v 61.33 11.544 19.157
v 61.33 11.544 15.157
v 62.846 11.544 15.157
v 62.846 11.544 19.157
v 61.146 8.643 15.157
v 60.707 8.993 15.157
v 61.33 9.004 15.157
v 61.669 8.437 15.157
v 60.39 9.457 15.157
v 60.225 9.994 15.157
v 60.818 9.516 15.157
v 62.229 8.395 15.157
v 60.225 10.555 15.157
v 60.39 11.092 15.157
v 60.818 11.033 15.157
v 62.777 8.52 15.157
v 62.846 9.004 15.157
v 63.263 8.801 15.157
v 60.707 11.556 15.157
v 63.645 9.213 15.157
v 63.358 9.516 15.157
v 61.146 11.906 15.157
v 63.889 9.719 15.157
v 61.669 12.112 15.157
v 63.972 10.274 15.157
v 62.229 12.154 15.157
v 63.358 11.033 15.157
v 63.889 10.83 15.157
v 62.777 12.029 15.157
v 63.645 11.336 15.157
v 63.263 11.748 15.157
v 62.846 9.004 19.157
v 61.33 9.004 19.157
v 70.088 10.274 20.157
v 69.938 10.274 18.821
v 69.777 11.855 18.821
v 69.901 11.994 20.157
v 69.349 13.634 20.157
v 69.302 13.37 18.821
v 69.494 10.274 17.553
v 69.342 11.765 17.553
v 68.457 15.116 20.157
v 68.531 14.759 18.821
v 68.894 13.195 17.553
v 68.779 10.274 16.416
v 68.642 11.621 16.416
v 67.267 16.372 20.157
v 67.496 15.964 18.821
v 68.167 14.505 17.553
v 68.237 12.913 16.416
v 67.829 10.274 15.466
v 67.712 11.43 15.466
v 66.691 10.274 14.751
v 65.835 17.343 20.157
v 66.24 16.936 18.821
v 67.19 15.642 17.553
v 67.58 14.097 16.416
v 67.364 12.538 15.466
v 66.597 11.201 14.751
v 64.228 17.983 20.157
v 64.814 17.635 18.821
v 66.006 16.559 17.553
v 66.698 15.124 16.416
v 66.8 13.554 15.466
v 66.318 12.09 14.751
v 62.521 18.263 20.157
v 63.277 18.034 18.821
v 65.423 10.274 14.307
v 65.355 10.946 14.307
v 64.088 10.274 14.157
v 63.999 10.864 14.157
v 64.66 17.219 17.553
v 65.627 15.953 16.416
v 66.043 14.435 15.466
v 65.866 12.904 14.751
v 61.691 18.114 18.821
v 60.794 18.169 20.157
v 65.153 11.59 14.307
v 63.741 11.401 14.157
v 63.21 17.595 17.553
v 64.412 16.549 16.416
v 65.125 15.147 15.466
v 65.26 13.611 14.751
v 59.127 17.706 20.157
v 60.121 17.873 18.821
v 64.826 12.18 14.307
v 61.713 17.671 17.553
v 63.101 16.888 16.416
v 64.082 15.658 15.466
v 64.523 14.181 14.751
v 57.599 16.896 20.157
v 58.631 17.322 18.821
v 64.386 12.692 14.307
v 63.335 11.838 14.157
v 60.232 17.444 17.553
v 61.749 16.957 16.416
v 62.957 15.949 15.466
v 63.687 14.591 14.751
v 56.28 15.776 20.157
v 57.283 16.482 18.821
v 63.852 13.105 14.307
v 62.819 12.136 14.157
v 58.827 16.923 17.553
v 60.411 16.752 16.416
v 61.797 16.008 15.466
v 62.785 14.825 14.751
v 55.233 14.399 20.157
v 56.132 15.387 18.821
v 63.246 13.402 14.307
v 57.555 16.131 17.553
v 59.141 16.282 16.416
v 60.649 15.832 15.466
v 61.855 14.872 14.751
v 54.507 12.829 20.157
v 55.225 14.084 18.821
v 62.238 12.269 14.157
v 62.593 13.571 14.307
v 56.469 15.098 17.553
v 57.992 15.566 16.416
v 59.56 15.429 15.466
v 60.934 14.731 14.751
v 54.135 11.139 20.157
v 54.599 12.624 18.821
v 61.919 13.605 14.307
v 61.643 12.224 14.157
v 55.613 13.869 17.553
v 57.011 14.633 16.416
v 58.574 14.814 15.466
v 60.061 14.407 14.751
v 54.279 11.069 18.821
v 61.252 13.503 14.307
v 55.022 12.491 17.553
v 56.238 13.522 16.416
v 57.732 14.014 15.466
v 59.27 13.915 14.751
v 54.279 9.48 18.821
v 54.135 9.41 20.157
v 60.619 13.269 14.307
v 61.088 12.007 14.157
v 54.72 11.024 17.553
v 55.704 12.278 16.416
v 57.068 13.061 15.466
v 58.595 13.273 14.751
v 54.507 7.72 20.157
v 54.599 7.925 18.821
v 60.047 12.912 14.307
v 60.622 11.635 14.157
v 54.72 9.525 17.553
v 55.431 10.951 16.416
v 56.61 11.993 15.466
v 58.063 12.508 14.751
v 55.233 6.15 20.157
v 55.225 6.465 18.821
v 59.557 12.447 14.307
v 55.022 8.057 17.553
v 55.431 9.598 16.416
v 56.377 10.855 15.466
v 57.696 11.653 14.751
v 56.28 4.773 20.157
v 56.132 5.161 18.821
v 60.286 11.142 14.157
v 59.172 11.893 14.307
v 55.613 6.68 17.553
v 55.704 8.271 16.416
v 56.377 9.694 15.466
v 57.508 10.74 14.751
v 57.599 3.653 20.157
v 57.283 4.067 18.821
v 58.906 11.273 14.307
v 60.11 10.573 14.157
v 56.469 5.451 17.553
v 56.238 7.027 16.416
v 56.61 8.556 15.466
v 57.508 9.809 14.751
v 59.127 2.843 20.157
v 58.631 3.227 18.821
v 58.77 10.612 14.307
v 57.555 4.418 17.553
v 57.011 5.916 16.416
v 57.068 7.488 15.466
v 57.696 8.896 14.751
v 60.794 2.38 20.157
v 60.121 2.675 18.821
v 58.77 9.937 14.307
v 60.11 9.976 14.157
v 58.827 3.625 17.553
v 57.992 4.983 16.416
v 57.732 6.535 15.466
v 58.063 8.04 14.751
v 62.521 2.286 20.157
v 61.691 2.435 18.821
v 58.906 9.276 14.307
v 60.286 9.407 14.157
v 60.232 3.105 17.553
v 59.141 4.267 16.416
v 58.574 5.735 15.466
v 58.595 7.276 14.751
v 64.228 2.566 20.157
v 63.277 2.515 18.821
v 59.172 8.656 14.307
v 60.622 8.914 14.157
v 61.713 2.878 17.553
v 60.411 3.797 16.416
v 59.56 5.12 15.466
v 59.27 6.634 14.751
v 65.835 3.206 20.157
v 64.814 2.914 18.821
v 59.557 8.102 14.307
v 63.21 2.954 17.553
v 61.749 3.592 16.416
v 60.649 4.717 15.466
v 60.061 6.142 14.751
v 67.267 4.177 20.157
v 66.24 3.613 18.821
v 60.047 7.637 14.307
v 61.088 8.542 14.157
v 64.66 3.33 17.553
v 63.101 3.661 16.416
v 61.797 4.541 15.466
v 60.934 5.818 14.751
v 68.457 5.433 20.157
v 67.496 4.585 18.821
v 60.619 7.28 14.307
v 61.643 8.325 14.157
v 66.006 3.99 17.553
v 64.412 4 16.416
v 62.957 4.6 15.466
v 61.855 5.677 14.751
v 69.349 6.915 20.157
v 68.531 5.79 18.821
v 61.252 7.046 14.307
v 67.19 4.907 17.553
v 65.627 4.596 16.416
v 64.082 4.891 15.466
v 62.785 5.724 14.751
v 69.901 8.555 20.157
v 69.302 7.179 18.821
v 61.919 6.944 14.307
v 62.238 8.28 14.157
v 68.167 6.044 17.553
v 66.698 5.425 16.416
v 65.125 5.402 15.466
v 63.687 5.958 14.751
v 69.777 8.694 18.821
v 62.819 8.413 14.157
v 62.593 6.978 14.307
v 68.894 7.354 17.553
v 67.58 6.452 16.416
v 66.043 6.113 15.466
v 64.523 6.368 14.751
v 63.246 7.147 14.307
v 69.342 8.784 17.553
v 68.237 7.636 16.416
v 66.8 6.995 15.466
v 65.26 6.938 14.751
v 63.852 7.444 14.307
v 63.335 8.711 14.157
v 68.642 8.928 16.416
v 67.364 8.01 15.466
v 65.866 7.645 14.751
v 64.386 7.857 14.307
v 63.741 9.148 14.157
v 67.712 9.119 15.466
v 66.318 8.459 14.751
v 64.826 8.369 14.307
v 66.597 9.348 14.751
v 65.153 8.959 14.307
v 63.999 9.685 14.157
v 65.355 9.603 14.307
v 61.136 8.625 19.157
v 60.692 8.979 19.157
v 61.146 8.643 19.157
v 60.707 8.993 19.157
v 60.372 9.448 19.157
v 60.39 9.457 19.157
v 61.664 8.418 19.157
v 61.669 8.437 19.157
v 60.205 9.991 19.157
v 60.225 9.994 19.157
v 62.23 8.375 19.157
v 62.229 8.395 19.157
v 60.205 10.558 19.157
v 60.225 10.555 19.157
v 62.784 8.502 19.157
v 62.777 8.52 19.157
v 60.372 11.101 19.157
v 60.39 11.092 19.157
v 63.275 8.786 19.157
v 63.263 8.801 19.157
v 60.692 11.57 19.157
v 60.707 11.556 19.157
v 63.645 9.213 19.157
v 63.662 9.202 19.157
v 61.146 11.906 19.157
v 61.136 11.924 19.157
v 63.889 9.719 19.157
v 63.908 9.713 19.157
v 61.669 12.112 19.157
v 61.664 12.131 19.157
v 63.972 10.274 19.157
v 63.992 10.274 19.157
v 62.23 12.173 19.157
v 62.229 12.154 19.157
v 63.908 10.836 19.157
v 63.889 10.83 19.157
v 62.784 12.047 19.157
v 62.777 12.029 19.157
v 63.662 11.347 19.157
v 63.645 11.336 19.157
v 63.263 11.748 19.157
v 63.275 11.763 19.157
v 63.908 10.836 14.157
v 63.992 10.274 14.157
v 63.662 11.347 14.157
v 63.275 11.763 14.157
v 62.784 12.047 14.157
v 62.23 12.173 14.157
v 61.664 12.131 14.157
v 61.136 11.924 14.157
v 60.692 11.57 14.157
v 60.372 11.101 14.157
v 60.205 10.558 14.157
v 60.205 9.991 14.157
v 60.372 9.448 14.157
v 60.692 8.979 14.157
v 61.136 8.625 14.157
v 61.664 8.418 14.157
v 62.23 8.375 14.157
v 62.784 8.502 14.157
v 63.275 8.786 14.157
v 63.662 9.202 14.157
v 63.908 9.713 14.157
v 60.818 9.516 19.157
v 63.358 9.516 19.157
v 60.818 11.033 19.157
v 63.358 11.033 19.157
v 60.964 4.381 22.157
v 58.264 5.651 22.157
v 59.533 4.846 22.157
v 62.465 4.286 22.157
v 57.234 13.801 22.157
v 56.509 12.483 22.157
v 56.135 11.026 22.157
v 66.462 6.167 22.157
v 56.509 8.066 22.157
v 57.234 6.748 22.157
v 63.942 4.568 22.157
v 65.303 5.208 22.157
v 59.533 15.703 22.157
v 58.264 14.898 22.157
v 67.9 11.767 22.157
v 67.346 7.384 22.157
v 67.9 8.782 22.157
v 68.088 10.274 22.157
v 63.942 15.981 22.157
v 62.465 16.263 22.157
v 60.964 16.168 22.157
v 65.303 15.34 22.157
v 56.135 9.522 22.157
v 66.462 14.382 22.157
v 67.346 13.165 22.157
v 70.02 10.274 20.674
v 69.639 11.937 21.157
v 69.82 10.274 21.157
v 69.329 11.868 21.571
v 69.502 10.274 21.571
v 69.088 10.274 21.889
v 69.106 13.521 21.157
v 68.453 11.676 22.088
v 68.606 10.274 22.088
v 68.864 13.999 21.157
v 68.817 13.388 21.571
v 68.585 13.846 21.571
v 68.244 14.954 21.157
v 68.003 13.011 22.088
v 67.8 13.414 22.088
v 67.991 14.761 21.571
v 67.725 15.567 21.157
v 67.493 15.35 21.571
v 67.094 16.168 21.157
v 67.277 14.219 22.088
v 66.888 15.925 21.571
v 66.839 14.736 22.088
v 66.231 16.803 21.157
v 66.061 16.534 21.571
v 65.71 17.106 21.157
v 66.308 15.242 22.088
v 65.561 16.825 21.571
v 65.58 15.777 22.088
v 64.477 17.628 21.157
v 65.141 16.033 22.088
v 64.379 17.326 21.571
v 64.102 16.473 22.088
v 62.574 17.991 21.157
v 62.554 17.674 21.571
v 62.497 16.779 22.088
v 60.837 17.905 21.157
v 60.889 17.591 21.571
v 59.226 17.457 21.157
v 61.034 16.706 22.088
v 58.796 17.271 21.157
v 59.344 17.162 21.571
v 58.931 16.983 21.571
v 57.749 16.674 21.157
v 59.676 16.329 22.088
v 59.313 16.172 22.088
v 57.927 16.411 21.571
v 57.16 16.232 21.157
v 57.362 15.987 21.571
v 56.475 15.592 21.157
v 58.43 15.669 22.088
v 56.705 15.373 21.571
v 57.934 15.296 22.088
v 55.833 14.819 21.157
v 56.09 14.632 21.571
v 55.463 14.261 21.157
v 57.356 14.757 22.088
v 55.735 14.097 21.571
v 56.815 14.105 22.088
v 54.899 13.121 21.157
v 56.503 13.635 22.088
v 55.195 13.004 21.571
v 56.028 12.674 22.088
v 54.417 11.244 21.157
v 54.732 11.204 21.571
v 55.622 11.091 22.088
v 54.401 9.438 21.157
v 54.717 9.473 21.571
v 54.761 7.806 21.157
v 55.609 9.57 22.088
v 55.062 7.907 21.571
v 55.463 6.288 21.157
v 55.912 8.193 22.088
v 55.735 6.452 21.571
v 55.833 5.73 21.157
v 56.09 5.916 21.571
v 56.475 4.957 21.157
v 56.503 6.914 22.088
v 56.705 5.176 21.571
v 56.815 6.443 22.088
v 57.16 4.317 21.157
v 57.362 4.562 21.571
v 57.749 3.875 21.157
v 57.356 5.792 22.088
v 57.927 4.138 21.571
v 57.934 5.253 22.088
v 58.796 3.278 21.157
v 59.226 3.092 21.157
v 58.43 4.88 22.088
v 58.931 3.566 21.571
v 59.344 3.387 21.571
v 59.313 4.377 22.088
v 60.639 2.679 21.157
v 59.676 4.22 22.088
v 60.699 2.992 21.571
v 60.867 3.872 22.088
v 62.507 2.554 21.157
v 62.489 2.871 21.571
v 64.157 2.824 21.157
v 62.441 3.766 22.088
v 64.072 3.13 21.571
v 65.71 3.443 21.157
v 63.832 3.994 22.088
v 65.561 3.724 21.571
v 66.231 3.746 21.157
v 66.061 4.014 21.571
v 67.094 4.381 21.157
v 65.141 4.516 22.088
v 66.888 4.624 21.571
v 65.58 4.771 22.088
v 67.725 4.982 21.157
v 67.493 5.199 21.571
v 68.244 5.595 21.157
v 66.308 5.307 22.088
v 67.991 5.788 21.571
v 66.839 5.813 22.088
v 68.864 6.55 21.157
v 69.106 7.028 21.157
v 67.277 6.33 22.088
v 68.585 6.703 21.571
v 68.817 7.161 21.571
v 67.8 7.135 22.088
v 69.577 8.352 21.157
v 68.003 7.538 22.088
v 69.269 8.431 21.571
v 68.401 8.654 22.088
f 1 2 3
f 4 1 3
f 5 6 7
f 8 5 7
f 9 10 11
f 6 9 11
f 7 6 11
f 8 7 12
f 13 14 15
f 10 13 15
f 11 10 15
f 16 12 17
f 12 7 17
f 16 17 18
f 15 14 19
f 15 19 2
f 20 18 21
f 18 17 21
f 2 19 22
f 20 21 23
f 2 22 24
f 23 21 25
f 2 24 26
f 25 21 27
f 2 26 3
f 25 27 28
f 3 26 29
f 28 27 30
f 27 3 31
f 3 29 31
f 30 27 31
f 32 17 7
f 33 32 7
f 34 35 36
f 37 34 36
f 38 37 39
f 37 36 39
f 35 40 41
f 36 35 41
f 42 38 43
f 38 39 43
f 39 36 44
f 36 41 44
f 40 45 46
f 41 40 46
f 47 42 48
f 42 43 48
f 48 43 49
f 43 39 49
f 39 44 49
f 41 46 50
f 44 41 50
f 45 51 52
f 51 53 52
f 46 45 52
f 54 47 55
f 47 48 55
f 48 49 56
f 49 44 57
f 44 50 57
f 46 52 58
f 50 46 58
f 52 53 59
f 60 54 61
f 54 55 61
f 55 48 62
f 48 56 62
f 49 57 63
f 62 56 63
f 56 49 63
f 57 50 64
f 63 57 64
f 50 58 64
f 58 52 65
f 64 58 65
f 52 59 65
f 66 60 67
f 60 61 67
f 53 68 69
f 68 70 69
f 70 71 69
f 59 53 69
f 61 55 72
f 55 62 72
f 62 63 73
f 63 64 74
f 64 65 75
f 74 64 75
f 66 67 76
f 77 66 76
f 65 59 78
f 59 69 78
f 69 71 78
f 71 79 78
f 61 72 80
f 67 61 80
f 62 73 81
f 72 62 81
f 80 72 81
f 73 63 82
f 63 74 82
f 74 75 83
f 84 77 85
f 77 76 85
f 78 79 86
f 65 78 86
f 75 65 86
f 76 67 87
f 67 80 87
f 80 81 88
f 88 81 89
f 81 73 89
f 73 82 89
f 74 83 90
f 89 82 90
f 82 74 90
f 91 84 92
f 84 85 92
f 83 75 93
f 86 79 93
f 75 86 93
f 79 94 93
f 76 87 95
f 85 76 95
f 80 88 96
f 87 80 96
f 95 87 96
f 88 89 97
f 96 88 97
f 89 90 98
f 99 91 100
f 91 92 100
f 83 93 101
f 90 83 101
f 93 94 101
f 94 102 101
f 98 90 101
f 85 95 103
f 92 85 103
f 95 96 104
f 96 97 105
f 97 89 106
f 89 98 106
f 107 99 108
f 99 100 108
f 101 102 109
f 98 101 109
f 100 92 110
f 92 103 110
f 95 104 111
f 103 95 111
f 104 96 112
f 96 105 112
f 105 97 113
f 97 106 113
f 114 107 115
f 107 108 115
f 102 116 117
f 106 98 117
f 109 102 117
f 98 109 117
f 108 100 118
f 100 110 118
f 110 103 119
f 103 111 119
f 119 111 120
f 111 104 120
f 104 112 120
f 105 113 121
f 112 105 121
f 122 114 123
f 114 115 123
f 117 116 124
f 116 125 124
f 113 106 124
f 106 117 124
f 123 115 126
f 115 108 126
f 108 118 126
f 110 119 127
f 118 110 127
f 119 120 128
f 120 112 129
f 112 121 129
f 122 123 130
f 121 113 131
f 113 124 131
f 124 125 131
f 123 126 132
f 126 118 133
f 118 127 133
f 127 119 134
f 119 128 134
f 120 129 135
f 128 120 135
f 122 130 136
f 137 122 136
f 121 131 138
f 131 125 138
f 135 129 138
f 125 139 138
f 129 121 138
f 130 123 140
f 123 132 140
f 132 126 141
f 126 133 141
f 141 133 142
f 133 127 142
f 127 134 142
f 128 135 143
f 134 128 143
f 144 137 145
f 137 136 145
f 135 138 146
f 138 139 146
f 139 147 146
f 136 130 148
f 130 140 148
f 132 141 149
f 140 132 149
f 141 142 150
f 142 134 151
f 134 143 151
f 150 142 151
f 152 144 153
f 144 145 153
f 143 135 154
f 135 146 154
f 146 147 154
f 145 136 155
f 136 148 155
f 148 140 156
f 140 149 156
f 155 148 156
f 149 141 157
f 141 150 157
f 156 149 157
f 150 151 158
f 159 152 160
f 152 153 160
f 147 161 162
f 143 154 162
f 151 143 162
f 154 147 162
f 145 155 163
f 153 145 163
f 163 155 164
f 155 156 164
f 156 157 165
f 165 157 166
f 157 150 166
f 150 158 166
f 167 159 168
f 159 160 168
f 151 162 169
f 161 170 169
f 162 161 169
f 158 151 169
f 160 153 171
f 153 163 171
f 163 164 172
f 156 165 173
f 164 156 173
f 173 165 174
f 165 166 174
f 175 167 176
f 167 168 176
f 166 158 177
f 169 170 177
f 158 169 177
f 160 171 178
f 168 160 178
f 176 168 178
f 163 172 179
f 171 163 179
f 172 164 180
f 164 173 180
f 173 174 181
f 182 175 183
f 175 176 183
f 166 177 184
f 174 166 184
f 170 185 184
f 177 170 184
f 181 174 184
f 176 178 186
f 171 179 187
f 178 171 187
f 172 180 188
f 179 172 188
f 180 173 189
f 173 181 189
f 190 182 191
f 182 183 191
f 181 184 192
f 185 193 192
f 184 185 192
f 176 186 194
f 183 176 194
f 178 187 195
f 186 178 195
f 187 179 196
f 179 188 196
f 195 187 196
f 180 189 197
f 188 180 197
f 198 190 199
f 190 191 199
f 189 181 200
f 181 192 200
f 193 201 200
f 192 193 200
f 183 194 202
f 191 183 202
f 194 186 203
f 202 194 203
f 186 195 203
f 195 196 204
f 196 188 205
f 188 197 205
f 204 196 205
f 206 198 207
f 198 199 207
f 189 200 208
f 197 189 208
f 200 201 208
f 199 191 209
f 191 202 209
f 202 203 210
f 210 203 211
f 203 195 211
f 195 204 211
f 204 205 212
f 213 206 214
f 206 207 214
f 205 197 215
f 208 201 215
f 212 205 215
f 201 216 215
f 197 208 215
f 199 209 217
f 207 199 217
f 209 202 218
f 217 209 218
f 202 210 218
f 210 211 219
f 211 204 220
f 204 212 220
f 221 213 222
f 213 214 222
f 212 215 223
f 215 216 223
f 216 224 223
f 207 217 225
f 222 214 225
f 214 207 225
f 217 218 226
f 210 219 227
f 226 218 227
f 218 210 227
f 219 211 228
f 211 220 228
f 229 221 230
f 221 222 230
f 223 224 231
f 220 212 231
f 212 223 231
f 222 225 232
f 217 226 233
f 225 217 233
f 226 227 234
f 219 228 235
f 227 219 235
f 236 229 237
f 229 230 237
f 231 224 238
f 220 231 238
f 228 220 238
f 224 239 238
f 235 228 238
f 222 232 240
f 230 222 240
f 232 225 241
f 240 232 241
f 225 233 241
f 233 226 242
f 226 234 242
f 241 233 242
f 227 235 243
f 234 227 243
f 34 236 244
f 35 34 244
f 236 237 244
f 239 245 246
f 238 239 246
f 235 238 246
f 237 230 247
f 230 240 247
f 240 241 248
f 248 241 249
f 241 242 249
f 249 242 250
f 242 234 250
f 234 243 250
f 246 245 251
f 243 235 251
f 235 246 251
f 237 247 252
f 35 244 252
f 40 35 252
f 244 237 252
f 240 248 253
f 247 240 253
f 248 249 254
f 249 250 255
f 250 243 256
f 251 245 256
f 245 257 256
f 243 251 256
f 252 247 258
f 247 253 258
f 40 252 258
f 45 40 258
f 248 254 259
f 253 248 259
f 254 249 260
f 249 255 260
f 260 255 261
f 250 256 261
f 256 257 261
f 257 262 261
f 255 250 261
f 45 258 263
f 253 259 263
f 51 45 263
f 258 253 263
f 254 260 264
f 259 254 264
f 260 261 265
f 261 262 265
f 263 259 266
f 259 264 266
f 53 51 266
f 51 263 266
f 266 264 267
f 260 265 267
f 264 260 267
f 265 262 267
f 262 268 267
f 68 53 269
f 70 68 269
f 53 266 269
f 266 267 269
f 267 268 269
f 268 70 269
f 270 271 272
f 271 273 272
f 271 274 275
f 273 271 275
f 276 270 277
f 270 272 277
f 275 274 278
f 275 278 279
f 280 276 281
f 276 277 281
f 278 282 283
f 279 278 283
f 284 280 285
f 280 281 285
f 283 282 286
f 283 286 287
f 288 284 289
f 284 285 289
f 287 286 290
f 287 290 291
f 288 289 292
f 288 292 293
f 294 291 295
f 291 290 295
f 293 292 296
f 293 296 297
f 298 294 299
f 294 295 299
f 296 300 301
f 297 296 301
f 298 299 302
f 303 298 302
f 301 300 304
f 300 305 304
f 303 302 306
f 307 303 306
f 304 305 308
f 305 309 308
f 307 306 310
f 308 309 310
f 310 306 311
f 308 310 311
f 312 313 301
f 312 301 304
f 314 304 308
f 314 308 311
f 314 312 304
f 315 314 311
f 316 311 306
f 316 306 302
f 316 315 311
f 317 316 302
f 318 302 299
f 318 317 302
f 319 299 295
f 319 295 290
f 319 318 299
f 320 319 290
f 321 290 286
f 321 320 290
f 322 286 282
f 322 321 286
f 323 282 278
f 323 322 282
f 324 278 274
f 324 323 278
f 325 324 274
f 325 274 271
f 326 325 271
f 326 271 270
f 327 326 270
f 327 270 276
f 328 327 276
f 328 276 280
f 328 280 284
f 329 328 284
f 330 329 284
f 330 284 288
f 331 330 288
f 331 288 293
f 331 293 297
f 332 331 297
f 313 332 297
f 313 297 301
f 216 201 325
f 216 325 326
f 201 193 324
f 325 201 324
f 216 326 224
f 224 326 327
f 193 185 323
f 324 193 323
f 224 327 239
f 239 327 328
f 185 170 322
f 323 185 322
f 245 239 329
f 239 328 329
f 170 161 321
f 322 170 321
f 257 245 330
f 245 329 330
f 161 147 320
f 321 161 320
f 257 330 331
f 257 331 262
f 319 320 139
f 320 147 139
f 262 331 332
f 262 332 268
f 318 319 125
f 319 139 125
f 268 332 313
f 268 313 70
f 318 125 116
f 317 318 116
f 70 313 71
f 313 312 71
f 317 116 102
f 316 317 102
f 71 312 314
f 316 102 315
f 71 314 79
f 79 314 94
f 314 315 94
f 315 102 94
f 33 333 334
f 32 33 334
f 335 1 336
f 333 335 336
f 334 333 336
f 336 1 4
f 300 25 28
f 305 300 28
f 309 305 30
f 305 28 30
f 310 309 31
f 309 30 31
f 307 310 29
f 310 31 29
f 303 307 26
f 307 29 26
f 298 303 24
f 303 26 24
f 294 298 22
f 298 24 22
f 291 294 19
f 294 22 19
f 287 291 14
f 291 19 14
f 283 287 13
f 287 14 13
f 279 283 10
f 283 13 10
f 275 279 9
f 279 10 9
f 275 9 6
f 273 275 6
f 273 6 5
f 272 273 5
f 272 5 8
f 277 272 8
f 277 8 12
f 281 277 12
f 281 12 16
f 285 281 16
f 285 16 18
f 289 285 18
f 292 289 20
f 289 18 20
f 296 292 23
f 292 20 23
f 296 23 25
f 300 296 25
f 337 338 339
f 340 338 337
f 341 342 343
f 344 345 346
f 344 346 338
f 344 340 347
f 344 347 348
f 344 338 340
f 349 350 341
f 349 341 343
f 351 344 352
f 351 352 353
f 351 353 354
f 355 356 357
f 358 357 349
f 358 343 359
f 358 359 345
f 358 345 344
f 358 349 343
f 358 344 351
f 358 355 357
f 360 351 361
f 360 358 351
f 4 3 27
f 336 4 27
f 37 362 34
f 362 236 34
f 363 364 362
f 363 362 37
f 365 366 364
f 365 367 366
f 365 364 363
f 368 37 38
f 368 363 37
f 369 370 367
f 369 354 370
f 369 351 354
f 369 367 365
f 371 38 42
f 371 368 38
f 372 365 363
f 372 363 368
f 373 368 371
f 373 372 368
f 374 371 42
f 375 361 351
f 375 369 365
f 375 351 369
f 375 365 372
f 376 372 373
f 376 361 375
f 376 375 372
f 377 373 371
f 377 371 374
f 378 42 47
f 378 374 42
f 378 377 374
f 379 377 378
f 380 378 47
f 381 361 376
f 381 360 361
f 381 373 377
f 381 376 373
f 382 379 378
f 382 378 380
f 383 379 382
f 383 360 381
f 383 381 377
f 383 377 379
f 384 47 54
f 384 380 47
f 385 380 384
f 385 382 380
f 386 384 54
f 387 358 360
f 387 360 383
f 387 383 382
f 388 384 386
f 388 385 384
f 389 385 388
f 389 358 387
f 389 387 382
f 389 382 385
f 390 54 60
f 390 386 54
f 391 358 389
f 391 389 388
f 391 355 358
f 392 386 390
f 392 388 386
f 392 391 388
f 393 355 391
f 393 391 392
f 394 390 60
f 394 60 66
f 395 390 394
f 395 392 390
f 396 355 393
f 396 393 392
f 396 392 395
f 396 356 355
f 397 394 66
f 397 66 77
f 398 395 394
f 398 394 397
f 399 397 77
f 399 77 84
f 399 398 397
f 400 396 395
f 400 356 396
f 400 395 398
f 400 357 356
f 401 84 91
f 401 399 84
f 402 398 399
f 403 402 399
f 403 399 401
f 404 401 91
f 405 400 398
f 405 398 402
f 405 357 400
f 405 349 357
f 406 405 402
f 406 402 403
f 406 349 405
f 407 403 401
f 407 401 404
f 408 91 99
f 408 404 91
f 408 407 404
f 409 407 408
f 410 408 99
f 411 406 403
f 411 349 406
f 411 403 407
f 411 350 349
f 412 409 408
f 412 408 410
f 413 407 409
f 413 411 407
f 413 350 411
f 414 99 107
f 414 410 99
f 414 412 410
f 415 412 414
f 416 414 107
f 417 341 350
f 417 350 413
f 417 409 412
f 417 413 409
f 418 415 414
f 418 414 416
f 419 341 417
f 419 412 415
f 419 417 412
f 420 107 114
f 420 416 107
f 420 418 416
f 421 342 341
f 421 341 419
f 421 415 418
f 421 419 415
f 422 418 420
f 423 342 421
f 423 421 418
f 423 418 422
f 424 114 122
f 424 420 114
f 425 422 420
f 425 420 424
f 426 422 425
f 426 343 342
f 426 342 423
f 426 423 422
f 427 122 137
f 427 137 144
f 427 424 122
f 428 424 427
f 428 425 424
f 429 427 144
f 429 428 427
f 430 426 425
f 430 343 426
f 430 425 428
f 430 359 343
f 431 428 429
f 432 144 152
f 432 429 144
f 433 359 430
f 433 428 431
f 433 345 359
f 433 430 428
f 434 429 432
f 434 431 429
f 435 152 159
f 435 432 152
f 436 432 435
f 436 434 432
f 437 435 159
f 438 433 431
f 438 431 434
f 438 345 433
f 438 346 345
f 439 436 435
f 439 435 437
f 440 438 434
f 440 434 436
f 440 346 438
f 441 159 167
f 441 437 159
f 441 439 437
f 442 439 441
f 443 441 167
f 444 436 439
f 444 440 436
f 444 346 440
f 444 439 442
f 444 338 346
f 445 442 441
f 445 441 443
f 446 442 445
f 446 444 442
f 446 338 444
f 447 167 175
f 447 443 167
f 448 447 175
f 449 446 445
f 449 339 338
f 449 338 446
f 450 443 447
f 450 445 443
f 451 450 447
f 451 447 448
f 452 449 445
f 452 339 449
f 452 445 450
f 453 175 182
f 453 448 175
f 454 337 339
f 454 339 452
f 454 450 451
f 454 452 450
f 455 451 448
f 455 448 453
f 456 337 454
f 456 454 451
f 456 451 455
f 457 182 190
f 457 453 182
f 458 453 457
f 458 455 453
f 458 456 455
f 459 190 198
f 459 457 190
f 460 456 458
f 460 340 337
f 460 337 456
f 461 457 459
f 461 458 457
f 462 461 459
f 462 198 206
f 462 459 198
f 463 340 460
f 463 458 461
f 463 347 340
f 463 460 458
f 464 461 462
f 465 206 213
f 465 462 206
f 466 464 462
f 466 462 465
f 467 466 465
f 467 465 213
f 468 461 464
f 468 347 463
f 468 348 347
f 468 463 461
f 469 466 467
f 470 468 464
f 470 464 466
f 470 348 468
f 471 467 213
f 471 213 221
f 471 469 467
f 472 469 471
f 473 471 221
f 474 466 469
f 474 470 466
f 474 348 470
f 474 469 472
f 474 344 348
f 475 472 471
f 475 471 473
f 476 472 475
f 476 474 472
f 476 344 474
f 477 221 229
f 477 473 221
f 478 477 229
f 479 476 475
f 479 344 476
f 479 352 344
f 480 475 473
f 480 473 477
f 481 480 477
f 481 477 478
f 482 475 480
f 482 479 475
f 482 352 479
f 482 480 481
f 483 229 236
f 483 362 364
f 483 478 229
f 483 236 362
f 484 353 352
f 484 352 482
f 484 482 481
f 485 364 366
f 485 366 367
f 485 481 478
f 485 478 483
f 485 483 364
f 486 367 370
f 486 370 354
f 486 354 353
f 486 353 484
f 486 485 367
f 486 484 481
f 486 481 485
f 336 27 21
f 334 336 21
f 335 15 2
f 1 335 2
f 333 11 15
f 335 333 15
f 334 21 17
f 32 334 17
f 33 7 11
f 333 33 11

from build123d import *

# Parameters (mm, degrees)
EXTRUDE_3_OUTLINE_R   = 8
EXTRUDE_3_OUTLINE_R_2 = 1.904306864
EXTRUDE_3_OUTLINE_R_3 = 1.884306864
EXTRUDE_3_DEPTH       = 4
EXTRUDE_START         = -1
SKETCH_4_3_R          = 8
SKETCH_4_3_R_2        = 1.904306864
EXTRUDE_4_DEPTH       = 1
SKETCH_5_R            = 8
EXTRUDE_5_DEPTH       = 3
FILLET_3_R            = 2
FILLET_4_R            = 6


# Read off the part's stored shape, not the designer's step: 凸台-拉伸3
with BuildPart() as part:
    # 凸台-拉伸3 outline → 凸台-拉伸3 (new body)
    # profile 1 of 2: a face of its own
    with BuildSketch(Plane.XY.offset(15.156605354)):
        with Locations((62.088098202, 10.274465036)):
            Circle(EXTRUDE_3_OUTLINE_R)
        with Locations((62.088098202, 10.274465036)):
            Circle(EXTRUDE_3_OUTLINE_R_2, mode=Mode.SUBTRACT)
    # profile 2 of 2: a face of its own
    with BuildSketch(Plane.XY.offset(15.156605354)):
        with Locations((62.088098202, 10.274465036)):
            Circle(EXTRUDE_3_OUTLINE_R_3)
        Polygon((62.846382474, 11.544465036), (63.358098202, 11.032749307), (63.358098202, 9.516180765), (62.846382474, 9.004465036), (61.329813931, 9.004465036), (60.818098202, 9.516180765), (60.818098202, 11.032749307), (61.329813931, 11.544465036), align=None, mode=Mode.SUBTRACT)
    extrude(amount=EXTRUDE_3_DEPTH)

    # 草图4<3> → 凸台-拉伸4 (add)
    with BuildSketch(Plane.XY.offset(15.156605354).offset(EXTRUDE_START)):
        with Locations((62.088098202, 10.274465036)):
            Circle(SKETCH_4_3_R)
        with Locations((62.088098202, 10.274465036)):
            Circle(SKETCH_4_3_R_2, mode=Mode.SUBTRACT)
    extrude(amount=EXTRUDE_4_DEPTH)

    # 草图5 → 凸台-拉伸5 (add)
    with BuildSketch(Plane.XY.offset(19.156605354)):
        with Locations((62.088098202, 10.274465036)):
            Circle(SKETCH_5_R)
    extrude(amount=EXTRUDE_5_DEPTH)

    # 圆角3
    fillet_3_edges = [part.edges().sort_by_distance(p)[0] for p in [
        (54.088098202, 10.274465036, 22.156605354),
    ]]
    fillet(fillet_3_edges, radius=FILLET_3_R)

    # 圆角4
    fillet_4_edges = [part.edges().sort_by_distance(p)[0] for p in [
        (54.088098202, 10.274465036, 14.156605354),
    ]]
    fillet(fillet_4_edges, radius=FILLET_4_R - 0.0001)  # a hair under: the kernel refuses the full size


solid = part.part
